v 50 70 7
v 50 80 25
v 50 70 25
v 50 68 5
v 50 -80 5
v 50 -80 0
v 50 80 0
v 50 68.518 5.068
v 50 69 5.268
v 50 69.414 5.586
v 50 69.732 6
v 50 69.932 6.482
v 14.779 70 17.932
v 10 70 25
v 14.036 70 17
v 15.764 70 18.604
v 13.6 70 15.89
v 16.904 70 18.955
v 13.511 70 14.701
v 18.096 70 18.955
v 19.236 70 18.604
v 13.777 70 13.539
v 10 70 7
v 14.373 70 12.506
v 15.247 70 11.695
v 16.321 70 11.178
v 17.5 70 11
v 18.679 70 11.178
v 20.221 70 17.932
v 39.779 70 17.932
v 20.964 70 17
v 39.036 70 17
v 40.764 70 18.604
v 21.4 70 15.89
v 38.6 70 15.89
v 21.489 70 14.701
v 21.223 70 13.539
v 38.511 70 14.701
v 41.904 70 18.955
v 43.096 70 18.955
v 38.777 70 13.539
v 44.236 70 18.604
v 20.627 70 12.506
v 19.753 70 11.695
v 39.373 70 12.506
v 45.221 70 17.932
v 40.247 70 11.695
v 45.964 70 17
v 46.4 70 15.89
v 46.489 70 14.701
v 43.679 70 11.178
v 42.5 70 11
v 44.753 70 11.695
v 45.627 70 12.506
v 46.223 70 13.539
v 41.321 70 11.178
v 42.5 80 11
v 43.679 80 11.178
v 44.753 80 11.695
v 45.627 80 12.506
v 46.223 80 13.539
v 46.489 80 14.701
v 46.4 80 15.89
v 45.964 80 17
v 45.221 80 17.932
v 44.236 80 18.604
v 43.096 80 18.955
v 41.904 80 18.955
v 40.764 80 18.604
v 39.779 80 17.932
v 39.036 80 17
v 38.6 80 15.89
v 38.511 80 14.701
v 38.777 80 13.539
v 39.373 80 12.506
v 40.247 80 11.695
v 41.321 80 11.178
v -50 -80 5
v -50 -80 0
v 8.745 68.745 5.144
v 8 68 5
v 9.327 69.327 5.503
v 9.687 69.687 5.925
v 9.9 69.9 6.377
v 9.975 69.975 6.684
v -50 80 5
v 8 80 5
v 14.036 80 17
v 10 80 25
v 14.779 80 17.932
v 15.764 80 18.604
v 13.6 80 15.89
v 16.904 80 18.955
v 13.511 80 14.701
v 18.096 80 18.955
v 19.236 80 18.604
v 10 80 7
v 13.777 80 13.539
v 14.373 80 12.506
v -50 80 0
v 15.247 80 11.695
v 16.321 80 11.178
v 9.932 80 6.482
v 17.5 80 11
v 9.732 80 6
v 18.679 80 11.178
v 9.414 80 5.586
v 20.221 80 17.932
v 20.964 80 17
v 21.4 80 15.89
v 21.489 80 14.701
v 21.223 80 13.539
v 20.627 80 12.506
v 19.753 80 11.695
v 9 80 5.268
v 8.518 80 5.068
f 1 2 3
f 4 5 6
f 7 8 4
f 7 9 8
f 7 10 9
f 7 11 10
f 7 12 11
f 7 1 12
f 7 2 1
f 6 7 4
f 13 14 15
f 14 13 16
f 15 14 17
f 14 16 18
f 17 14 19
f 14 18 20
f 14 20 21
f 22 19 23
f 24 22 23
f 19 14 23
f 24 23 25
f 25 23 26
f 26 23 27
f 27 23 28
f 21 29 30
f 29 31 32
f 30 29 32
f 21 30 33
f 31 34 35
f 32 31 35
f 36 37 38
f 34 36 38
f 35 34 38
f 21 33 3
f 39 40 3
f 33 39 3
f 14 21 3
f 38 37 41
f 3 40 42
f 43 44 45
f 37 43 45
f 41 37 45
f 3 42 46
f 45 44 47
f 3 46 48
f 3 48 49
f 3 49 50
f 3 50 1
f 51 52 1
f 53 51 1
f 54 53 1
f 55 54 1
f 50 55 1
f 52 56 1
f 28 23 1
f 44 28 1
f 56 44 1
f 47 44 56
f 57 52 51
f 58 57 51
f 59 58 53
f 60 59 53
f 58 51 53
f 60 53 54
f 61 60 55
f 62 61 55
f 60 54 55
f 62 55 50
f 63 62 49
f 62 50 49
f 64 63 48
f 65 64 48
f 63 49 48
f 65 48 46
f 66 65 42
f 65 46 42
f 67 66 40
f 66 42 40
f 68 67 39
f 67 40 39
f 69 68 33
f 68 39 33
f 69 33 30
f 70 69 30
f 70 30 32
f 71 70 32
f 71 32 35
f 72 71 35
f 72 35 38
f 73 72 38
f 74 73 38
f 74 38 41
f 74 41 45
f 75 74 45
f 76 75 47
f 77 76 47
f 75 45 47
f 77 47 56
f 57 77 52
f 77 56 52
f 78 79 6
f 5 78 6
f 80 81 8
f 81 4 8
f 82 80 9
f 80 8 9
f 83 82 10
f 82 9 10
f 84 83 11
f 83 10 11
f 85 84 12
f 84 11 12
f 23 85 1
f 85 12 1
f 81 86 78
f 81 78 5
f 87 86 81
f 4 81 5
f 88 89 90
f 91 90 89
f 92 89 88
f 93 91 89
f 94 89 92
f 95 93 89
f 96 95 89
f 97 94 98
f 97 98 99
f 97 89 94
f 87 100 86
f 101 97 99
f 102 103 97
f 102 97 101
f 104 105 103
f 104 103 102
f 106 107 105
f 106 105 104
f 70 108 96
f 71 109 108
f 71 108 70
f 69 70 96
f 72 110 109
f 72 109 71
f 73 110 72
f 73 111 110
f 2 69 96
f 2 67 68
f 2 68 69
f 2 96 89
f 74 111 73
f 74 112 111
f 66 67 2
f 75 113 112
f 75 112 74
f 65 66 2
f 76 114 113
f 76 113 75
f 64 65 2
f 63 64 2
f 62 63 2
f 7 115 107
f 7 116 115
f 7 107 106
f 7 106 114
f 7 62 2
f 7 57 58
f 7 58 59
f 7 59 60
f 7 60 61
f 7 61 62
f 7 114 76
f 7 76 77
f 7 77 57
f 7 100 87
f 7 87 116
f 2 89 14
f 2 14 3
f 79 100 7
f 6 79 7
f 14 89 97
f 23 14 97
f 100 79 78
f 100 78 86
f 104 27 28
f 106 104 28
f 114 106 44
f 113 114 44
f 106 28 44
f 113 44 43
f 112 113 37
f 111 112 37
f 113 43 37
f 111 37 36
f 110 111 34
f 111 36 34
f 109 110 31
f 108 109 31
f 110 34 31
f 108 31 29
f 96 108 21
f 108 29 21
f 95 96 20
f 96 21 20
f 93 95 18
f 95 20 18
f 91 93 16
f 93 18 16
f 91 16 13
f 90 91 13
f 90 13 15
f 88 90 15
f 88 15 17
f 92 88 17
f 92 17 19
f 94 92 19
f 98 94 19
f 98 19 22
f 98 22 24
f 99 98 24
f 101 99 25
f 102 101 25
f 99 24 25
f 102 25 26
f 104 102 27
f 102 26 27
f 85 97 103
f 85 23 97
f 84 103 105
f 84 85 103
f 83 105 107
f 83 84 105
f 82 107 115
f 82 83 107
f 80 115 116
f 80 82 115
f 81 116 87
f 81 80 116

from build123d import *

# Parameters (mm, degrees)
SKETCH_1_W          = 100
SKETCH_1_H          = 160
EXTRUDE_1_DEPTH     = 5
SKETCH_2_W          = 40
SKETCH_2_H          = 20
EXTRUDE_2_DEPTH     = 10
SKETCH_3_R          = 4
CUT_EXTRUDE_1_DEPTH = 10
FILLET_1_R          = 2


with BuildPart() as part:
    # 草图1 → 凸台-拉伸1 (new body)
    with BuildSketch(Plane.XY):
        Rectangle(SKETCH_1_W, SKETCH_1_H)
    extrude(amount=EXTRUDE_1_DEPTH)

    # 草图2 → 凸台-拉伸2 (add)
    with BuildSketch(Plane(origin=(0, 80, 0), x_dir=(1, 0, 0), z_dir=(0, 1, 0))):
        with Locations((30, -15)):
            Rectangle(SKETCH_2_W, SKETCH_2_H)
    extrude(amount=-EXTRUDE_2_DEPTH)

    # 草图3 → 切除-拉伸1 (cut)
    with BuildSketch(Plane.XZ.offset(-70)):
        with Locations(Location((17.5, 15, 0), (0, 0, 270))):
            Circle(SKETCH_3_R)
        with Locations(Location((42.5, 15, 0), (0, 0, 270))):
            Circle(SKETCH_3_R)
    extrude(amount=-CUT_EXTRUDE_1_DEPTH, mode=Mode.SUBTRACT)

    # 圆角1
    fillet_1_edges = [part.edges().sort_by_distance(p)[0] for p in [
        (30, 70, 5),
        (10, 75, 5),
    ]]
    fillet(fillet_1_edges, radius=FILLET_1_R)


solid = part.part
